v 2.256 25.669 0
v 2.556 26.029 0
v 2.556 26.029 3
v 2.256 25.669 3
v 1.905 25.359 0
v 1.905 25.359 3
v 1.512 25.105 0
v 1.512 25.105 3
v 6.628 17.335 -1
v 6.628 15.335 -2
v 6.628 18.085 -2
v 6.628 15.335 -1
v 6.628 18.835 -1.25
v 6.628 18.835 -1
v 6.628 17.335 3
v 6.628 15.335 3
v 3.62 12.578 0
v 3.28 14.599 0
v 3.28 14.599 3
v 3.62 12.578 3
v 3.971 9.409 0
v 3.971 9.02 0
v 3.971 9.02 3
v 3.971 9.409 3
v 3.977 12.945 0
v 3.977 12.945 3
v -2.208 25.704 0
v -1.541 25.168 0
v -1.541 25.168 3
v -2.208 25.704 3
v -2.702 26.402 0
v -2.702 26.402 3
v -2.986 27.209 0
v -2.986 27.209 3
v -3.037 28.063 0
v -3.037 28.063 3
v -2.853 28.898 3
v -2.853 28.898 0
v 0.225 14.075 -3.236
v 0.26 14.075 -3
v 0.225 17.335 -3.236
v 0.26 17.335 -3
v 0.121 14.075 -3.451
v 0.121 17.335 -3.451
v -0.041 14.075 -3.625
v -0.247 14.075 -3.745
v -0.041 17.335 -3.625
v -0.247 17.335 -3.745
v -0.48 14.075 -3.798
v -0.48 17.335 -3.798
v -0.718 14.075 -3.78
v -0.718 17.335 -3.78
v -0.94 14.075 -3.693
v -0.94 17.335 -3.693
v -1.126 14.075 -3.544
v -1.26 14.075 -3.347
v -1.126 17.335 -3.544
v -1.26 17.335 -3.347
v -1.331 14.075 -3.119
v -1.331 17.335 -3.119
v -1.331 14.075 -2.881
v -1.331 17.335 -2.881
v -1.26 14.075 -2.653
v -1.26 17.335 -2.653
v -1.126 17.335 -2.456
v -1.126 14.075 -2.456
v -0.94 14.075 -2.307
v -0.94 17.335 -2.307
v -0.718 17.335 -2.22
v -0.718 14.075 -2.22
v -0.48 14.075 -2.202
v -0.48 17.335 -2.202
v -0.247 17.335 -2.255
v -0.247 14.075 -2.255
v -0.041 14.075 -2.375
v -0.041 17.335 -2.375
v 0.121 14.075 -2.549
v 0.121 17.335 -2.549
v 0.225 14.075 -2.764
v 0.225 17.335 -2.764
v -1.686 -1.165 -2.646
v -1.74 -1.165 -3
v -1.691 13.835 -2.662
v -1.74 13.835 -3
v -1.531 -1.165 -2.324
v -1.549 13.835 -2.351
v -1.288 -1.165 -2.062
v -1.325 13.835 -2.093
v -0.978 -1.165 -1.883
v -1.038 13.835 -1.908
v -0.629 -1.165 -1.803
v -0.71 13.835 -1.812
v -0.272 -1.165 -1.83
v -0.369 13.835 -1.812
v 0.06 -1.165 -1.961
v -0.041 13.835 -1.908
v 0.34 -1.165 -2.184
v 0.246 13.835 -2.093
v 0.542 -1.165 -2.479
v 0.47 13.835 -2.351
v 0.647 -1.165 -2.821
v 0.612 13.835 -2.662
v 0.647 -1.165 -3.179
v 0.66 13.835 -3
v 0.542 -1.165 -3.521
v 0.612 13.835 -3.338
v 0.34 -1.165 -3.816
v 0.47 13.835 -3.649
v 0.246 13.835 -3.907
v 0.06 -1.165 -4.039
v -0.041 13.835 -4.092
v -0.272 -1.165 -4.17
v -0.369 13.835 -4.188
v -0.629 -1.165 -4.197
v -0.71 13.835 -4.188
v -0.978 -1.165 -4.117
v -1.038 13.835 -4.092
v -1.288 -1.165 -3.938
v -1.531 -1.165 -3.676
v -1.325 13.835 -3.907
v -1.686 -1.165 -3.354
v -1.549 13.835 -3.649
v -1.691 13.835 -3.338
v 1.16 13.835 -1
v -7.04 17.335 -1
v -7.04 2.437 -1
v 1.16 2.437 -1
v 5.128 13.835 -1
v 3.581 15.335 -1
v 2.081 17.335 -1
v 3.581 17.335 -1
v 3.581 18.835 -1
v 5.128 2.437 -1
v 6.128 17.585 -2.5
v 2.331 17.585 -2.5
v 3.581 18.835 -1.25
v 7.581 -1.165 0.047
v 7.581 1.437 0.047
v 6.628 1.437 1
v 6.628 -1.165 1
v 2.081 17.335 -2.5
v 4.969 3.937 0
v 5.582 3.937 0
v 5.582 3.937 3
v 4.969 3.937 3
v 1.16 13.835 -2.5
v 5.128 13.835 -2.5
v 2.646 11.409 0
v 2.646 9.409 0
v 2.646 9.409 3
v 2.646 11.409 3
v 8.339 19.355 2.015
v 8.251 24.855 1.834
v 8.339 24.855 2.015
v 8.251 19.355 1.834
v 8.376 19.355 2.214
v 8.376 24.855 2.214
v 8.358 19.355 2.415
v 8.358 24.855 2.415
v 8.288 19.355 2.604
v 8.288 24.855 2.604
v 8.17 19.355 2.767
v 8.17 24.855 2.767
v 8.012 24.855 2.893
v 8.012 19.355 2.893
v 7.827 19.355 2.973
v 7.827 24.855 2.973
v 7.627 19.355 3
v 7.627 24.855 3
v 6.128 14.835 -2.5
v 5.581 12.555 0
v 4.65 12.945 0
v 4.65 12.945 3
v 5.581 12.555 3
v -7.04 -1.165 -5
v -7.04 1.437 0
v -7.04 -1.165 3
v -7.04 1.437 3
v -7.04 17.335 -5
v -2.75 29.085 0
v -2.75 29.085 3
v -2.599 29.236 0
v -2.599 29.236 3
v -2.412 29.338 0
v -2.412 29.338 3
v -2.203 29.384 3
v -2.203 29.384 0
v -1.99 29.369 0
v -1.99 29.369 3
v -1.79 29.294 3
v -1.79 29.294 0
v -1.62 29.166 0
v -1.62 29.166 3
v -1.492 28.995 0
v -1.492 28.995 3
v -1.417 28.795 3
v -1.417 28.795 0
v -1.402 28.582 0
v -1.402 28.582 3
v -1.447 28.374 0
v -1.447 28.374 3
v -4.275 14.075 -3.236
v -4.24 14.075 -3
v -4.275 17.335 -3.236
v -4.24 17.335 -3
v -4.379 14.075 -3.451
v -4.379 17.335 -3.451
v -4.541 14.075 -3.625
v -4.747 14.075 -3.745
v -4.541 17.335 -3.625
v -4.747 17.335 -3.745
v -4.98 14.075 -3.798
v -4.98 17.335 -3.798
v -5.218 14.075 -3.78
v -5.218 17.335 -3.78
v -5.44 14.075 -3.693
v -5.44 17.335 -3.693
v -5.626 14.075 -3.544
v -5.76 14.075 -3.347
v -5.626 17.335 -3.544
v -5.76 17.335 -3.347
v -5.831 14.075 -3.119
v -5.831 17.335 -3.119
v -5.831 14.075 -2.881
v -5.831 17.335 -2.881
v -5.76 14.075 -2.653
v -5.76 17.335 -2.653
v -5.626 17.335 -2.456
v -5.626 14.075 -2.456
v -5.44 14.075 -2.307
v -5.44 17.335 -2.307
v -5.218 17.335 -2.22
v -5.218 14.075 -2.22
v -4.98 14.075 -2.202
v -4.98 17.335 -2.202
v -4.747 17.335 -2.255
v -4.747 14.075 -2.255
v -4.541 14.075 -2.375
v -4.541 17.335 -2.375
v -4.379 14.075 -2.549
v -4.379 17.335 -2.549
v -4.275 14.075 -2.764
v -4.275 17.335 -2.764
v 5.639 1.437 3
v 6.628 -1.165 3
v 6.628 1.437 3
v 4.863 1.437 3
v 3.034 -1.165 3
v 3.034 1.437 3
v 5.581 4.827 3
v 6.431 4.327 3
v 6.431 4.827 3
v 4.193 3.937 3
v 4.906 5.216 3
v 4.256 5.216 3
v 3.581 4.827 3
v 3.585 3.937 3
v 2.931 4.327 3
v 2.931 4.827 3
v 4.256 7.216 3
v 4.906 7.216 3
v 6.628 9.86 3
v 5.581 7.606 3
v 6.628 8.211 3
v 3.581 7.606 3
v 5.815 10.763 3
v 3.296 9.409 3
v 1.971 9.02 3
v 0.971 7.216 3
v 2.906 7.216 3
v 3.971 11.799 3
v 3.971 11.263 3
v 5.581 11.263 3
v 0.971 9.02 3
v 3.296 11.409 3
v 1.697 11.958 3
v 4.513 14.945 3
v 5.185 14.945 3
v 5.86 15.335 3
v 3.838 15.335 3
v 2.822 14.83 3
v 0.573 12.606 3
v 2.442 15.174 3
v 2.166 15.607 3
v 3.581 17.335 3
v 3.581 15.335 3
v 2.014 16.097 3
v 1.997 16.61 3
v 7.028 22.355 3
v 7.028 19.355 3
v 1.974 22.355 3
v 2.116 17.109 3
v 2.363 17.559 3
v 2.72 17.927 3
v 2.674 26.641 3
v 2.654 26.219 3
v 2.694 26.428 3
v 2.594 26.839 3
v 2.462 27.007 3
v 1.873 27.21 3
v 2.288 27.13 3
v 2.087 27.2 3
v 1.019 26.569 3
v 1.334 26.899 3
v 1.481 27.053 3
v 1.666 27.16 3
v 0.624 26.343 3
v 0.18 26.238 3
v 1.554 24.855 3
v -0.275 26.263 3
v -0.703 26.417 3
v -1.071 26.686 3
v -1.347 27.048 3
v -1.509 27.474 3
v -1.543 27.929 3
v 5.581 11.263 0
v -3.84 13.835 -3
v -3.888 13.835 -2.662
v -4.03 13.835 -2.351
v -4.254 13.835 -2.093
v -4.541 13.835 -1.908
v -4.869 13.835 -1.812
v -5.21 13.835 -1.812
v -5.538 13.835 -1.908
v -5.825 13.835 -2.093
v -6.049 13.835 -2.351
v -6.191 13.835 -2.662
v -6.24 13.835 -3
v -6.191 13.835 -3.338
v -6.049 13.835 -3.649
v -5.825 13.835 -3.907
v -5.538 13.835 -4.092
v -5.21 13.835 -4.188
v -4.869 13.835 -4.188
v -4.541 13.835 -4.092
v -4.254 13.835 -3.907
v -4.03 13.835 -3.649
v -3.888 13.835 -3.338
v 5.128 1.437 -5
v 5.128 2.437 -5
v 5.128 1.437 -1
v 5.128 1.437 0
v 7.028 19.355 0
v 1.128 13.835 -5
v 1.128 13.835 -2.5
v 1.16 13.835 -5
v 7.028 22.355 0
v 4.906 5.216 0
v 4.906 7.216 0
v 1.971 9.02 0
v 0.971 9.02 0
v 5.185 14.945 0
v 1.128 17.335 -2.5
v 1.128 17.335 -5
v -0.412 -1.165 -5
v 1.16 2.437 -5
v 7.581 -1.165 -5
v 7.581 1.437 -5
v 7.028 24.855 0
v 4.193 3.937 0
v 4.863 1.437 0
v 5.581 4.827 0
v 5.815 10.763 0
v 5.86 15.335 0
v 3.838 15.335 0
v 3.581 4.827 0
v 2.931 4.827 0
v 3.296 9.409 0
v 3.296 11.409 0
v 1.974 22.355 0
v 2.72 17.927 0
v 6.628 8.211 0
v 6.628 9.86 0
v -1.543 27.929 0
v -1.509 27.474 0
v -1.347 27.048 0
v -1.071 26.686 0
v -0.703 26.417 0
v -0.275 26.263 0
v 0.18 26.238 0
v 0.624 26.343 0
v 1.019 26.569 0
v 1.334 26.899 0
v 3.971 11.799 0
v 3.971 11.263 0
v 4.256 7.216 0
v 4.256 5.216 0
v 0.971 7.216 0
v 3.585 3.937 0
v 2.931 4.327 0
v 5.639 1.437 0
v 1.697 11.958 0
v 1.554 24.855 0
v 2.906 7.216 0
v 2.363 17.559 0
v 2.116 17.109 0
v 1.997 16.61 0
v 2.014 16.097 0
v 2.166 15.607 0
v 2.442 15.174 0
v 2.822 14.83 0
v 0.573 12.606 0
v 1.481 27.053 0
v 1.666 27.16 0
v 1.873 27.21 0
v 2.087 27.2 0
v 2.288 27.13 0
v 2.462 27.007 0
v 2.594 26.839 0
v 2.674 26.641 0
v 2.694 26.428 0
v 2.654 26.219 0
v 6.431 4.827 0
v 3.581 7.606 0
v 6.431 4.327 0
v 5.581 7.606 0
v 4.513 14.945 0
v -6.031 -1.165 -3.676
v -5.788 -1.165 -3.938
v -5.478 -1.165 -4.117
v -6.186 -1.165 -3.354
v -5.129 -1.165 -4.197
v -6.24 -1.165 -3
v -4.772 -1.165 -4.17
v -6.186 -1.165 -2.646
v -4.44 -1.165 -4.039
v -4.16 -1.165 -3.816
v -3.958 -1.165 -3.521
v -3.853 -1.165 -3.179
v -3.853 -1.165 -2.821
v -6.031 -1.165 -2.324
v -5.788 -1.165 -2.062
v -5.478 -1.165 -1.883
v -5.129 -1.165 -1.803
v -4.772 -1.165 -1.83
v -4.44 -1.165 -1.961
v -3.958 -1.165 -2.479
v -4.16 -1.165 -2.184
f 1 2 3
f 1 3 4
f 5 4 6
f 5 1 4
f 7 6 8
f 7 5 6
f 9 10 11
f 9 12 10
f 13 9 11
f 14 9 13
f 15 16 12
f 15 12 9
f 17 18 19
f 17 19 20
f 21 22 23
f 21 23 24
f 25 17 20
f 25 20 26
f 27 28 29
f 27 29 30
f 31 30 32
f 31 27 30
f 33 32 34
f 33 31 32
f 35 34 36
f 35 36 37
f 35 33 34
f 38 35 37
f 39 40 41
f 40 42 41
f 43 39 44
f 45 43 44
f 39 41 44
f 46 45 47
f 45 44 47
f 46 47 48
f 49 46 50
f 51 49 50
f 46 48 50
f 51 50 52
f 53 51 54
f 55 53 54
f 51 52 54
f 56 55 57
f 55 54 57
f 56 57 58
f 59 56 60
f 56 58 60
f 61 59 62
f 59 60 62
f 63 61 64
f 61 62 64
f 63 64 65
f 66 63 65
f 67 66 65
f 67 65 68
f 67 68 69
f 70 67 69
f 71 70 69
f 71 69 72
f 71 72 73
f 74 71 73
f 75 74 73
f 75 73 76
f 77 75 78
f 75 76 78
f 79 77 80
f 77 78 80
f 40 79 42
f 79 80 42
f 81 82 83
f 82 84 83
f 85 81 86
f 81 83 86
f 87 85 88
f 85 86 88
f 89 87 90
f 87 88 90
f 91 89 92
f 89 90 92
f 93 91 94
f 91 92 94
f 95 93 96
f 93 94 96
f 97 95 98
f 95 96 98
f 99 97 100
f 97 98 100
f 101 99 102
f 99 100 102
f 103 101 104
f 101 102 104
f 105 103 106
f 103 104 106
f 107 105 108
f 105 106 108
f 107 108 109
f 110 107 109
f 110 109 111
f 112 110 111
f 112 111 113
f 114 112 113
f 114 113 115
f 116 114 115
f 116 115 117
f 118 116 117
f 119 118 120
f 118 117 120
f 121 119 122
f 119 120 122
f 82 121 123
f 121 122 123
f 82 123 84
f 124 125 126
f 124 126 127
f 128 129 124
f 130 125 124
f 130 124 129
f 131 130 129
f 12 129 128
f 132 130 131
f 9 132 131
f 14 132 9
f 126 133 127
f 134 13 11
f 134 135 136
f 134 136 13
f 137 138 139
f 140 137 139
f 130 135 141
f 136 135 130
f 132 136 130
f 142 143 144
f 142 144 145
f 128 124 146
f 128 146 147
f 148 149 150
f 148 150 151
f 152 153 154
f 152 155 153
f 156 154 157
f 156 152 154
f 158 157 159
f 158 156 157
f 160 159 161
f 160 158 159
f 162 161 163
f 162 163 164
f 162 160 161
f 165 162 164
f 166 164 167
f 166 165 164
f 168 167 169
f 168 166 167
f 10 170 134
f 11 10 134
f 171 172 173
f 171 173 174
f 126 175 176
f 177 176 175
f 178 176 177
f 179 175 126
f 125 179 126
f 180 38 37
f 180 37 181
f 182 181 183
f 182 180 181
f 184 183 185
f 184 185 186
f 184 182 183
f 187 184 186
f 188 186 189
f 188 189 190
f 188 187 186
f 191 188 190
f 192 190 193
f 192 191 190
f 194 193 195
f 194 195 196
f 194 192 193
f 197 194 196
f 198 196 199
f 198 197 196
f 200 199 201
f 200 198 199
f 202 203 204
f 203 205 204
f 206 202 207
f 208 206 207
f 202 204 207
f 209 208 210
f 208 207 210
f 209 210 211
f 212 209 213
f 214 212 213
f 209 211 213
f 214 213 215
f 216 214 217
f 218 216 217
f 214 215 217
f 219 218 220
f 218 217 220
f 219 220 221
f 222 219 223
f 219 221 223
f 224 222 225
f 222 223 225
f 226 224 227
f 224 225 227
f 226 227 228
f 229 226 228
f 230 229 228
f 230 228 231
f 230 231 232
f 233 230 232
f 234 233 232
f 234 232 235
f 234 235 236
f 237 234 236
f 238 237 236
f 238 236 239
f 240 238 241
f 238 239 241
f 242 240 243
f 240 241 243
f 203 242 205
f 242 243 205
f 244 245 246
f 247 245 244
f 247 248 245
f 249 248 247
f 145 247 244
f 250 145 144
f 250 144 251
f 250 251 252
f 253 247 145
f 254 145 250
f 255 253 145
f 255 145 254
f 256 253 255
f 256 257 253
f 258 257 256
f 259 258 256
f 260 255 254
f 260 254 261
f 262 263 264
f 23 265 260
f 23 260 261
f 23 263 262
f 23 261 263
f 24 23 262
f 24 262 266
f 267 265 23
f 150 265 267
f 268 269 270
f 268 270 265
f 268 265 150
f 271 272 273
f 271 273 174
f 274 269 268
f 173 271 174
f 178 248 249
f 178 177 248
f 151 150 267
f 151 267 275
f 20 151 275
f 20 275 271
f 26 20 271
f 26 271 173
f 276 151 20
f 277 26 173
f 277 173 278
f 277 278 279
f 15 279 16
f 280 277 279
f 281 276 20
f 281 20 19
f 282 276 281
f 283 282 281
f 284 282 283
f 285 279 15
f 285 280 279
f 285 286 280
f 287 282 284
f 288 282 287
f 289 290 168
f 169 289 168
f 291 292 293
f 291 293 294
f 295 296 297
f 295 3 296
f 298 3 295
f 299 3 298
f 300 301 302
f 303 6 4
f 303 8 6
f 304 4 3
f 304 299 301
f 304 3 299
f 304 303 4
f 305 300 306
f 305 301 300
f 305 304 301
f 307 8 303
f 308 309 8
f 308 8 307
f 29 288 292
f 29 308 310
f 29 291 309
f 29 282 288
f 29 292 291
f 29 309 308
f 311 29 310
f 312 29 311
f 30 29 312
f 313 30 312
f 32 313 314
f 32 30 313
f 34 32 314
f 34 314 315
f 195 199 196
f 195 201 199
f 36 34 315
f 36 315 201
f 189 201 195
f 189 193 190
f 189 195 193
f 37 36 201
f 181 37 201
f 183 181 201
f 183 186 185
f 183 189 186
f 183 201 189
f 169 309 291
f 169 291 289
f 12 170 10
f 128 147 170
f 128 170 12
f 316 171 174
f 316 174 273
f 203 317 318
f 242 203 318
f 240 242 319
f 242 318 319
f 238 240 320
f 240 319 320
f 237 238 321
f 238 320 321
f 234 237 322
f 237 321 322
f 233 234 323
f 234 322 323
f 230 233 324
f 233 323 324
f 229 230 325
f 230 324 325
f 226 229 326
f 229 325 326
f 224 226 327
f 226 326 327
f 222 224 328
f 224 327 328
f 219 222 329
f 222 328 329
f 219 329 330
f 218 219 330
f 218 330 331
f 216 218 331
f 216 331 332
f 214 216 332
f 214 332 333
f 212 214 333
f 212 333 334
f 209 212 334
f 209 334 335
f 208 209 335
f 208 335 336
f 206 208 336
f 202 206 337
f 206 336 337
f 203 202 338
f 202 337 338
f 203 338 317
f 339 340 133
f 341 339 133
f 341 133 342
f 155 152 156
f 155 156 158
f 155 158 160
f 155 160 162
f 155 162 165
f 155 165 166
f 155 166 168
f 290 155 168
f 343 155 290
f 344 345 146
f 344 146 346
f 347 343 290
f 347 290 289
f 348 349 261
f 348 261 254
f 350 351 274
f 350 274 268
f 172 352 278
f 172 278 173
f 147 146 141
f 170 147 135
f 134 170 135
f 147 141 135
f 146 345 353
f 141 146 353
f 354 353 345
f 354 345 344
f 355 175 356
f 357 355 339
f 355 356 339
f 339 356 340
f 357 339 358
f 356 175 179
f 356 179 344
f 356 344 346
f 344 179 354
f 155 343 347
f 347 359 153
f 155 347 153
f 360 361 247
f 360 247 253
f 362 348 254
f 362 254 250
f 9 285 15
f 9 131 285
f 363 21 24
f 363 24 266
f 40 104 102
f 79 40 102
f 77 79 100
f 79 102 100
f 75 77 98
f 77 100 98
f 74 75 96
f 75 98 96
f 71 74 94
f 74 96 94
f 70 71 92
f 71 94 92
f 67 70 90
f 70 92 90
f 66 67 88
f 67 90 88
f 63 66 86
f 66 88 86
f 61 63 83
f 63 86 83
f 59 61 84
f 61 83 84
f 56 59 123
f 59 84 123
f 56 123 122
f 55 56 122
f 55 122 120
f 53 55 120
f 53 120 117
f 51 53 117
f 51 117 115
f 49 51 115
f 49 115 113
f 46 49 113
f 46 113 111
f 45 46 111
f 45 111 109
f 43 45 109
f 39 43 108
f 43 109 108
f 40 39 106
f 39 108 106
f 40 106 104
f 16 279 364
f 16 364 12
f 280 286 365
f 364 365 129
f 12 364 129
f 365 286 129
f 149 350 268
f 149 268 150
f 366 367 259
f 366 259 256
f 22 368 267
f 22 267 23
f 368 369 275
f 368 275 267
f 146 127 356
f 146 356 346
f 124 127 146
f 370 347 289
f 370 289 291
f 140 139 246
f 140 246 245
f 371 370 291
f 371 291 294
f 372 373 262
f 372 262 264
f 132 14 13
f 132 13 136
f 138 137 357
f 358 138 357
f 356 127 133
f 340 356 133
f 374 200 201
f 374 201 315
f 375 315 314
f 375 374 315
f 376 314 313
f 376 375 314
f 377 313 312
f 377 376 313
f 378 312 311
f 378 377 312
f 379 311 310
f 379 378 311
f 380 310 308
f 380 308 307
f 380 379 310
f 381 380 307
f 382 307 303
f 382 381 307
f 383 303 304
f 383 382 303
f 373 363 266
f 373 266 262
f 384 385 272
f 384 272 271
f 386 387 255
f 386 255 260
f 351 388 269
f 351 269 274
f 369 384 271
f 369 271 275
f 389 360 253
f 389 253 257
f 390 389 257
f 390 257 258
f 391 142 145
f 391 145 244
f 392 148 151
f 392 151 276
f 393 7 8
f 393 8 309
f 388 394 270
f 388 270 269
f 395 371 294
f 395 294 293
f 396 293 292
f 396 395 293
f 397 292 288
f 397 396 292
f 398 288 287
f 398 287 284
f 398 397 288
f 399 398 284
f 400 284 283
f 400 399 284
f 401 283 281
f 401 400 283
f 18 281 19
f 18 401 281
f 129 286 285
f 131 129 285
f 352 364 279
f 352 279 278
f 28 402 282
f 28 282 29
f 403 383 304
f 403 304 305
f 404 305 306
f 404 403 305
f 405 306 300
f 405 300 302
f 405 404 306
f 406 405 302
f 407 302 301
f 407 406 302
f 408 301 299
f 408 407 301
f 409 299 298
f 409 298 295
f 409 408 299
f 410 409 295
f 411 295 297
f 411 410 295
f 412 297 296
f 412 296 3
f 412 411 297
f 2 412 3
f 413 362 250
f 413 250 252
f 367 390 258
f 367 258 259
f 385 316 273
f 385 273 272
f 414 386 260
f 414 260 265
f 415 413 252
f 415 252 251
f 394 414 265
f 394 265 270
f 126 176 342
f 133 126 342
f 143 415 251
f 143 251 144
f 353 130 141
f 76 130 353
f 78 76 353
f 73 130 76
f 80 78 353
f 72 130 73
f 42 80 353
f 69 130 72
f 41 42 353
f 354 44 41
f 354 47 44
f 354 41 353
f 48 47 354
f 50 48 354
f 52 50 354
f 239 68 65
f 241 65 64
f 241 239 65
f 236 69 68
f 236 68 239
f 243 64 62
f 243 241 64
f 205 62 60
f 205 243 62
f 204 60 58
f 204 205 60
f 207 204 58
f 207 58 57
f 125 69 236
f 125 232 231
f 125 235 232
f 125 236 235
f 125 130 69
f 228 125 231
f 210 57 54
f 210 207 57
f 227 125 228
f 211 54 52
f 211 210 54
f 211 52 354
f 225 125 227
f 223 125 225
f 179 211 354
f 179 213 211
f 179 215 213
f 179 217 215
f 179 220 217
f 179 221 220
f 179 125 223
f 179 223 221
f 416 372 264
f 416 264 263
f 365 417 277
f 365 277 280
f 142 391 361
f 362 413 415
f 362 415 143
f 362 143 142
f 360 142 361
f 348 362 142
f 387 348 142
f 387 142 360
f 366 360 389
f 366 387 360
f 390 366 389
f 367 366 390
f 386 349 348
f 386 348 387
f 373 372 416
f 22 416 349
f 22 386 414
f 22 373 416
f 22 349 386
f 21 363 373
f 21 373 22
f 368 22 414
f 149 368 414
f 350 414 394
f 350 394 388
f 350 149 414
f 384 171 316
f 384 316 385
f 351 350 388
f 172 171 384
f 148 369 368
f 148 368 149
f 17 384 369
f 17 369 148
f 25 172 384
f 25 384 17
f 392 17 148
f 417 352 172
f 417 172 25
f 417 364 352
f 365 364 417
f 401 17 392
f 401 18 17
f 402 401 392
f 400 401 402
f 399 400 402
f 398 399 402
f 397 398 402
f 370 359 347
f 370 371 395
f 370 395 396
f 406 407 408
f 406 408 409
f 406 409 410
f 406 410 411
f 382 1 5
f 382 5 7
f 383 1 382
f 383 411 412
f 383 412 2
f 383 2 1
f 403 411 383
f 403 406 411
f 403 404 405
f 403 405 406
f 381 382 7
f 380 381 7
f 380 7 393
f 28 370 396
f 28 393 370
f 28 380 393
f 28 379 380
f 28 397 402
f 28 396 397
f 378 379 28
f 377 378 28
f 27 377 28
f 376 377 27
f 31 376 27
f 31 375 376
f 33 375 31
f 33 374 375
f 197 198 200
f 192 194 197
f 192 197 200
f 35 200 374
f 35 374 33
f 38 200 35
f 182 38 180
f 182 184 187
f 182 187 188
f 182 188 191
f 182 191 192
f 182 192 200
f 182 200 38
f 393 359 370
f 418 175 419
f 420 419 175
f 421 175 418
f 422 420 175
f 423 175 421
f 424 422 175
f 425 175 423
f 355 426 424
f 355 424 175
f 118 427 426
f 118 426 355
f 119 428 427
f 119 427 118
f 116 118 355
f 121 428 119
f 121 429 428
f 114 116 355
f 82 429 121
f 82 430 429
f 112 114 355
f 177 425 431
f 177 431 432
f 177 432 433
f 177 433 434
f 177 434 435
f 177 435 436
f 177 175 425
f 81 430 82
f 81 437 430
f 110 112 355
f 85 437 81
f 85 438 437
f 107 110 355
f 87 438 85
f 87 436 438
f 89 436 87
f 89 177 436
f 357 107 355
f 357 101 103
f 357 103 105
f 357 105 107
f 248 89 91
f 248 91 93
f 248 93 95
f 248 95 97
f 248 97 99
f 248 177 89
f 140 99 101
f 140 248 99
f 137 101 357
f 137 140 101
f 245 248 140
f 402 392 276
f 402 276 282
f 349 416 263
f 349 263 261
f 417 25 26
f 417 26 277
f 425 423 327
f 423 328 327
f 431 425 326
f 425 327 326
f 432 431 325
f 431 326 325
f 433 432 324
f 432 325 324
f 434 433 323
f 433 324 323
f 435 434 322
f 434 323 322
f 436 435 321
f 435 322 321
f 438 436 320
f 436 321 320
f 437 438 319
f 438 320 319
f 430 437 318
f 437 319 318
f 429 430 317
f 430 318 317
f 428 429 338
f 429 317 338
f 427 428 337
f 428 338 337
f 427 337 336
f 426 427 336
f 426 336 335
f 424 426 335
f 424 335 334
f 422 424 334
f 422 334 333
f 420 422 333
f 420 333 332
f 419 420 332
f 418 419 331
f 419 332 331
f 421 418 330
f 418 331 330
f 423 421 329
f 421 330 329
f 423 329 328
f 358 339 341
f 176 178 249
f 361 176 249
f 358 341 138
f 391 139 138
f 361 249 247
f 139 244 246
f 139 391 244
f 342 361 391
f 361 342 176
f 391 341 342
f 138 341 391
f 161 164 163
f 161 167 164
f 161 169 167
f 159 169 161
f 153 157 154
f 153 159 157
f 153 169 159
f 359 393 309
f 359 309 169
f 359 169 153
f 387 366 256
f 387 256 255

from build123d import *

# Parameters (mm, degrees)
BOSS_SWITCH_BODY_DEPTH                    = 3
SKETCH1_W                                 = 4
SKETCH1_H                                 = 3.5
BOSS_FLANGE_WIDTH_DEPTH                   = 5
BOSS_FLANGE_HEIGHT_REACH                  = 35.863
SKETCH2_W                                 = 4
SKETCH2_H                                 = 2
SKETCH2_W_2                               = 8
SKETCH2_H_2                               = 2.602328973
CUT_UP_TO_DOWN_DERAILLEUR_CLEARANCE_REACH = 21.462
SKETCH10_W                                = 2.453096586
SKETCH10_H                                = 3
SKETCH17_W                                = 12.1675
SKETCH17_H                                = 4
BOSS_FLANGE_SUPPORT_DEPTH                 = 13.897671027
TAP_DRILL_FOR_M2X0_4_TAP1_D               = 1.6
M2_CLEARANCE_HOLE2_D                      = 2.4
M2_CLEARANCE_HOLE2_DEPTH                  = 15
M2_CLEARANCE_HOLE2_TIP                    = 0.721032743
CHAMFER_FLANGE_SUPPORT_SIZE               = 1.5
CHAMFER_FLANGE_SUPPORT_2_SIZE             = 1.5
CHAMFER_FLANGE_SUPPORT_3_SIZE             = 1
SKETCH23_W                                = 3.9675
SKETCH23_H                                = 11.397671027
CUT_GAP_FOR_PRINTING_DEPTH                = 32.000499688
SKETCH25_W                                = 0.953096586
SKETCH25_H                                = 3.5
CUT_DERAILLEUR_CLEARANCE_DEPTH            = 32.145320369
CHAMFER8_SIZE                             = 1
CUT_UP_TO_DOWN_CANTILEVER_SLOPE_REACH     = 34.315
SKETCH26_W                                = 5.907653686
SKETCH26_H                                = 5.795512344
CUT_WIDE_DERAILLEUR_CLEARANCE_DEPTH       = 33.195879702
CUT_WIDE_DERAILLEUR_CLEARANCE_DEPTH_BACK  = 4
SKETCH27_W                                = 2.5
SKETCH27_H                                = 5.000000046
CHAMFER9_SIZE                             = 1.25
SKETCH28_W                                = 3.046903414
SKETCH28_H                                = 1.5
CUT_EXTRUDE1_DEPTH                        = 1
FILLET1_R                                 = 0.75


# Some blends are built 0.0001 mm under size
with BuildPart() as part:
    # Sketch-SwitchBossUp → Boss-Switch Body (new body)
    with BuildSketch(Plane.XY):
        with BuildLine():
            Line((5.581091201, 12.55524379), (5.581100766, 11.263016279))
            Line((5.581100766, 11.263016279), (3.971265023, 11.263016279))
            Line((3.971265023, 11.263016279), (3.97126394, 11.79911022))
            Line((3.97126394, 11.79911022), (3.296271341, 11.409403061))
            Line((3.296271341, 11.409403061), (3.296271341, 9.409403061))
            Line((3.296271341, 9.409403061), (3.971278743, 9.019687356))
            Line((3.971278743, 9.019687356), (3.971278743, 9.409408058))
            Line((3.971278743, 9.409408058), (5.815189336, 10.763016279))
            Line((5.815189336, 10.763016279), (6.627976927, 9.860324207))
            Line((6.627976927, 9.860324207), (6.627976927, 8.210536505))
            Line((6.627976927, 8.210536505), (5.581127833, 7.606137899))
            Line((5.581127833, 7.606137899), (4.906138119, 7.216432406))
            Line((4.906138119, 7.216432406), (4.906138119, 5.216432406))
            Line((4.906138119, 5.216432406), (5.58114552, 4.826716701))
            Line((5.58114552, 4.826716701), (6.430577026, 4.826716701))
            Line((6.430577026, 4.826716701), (6.430577026, 4.326716701))
            Line((6.430577026, 4.326716701), (5.582379266, 3.937018274))
            Line((5.582379266, 3.937018274), (4.969366686, 3.937018274))
            Line((4.969366686, 3.937018274), (5.639239667, 1.437018274))
            Line((5.639239667, 1.437018274), (6.627976927, 1.437018274))
            Line((6.627976927, 1.437018274), (6.627976927, -1.165310699))
            Line((6.627976927, -1.165310699), (3.034464198, -1.165310699))
            Line((3.034464198, -1.165310699), (3.034464198, 1.437018274))
            Line((3.034464198, 1.437018274), (4.862782532, 1.437018274))
            Line((4.862782532, 1.437018274), (4.192909551, 3.937018274))
            Line((4.192909551, 3.937018274), (3.585032728, 3.937018274))
            Line((3.585032728, 3.937018274), (2.930577026, 4.326720436))
            Line((2.930577026, 4.326720436), (2.930577026, 4.826720436))
            Line((2.930577026, 4.826720436), (3.58114552, 4.826720436))
            Line((3.58114552, 4.826720436), (4.256138119, 5.216427595))
            Line((4.256138119, 5.216427595), (4.256138119, 7.216427595))
            Line((4.256138119, 7.216427595), (3.581130717, 7.6061433))
            Line((3.581130717, 7.6061433), (2.9061262, 7.216422599))
            Line((2.9061262, 7.216422599), (0.971281627, 7.216422599))
            Line((0.971281627, 7.216422599), (0.971281627, 9.019692757))
            Line((0.971281627, 9.019692757), (1.971281627, 9.019692757))
            Line((1.971281627, 9.019692757), (2.646271341, 9.40939825))
            Line((2.646271341, 9.40939825), (2.646271341, 11.40939825))
            Line((2.646271341, 11.40939825), (1.696557212, 11.957715958))
            Line((1.696557212, 11.957715958), (0.573317845, 12.60621851))
            Line((0.573317845, 12.60621851), (-1.541303694, 25.167805745))
            ThreePointArc((-1.541303694, 25.167805745), (-2.872284003, 26.795385437), (-2.852546321, 28.897797067))
            ThreePointArc((-2.852546321, 28.897797067), (-1.887813913, 29.338582026), (-1.447028953, 28.373849618))
            ThreePointArc((-1.447028953, 28.373849618), (-0.703448682, 26.416936722), (1.333779254, 26.898727173))
            ThreePointArc((1.333779254, 26.898727173), (2.379722745, 27.074801628), (2.555797201, 26.028858137))
            ThreePointArc((2.555797201, 26.028858137), (2.086504637, 25.507104397), (1.511513111, 25.104801997))
            Line((1.511513111, 25.104801997), (1.553598189, 24.854801997))
            Line((1.553598189, 24.854801997), (9.027976927, 24.854801997))
            Line((9.027976927, 24.854801997), (9.027976927, 22.354801997))
            Line((9.027976927, 22.354801997), (9.027976927, 19.354801997))
            Line((9.027976927, 19.354801997), (7.027976927, 19.354801997))
            Line((7.027976927, 19.354801997), (7.027976927, 22.354801997))
            Line((7.027976927, 22.354801997), (1.974448974, 22.354801997))
            Line((1.974448974, 22.354801997), (2.719778232, 17.927287042))
            ThreePointArc((2.719778232, 17.927287042), (2.013826204, 16.096957693), (3.280124137, 14.598637521))
            Line((3.280124137, 14.598637521), (3.620297651, 12.577888564))
            Line((3.620297651, 12.577888564), (3.976674365, 12.944956135))
            Line((3.976674365, 12.944956135), (4.512557947, 14.944960101))
            Line((4.512557947, 14.944960101), (3.837515632, 15.334689301))
            Line((3.837515632, 15.334689301), (3.581073513, 15.334689301))
            Line((3.581073513, 15.334689301), (3.581073513, 17.334689301))
            Line((3.581073513, 17.334689301), (5.725580434, 17.334689301))
            Line((5.725580434, 17.334689301), (6.627976927, 17.334689301))
            Line((6.627976927, 17.334689301), (6.627976927, 15.334689301))
            Line((6.627976927, 15.334689301), (5.860498075, 15.334689301))
            Line((5.860498075, 15.334689301), (5.185487464, 14.944965082))
            Line((5.185487464, 14.944965082), (4.649603883, 12.944961115))
            Line((4.649603883, 12.944961115), (5.581091201, 12.55524379))
        make_face()
    extrude(amount=BOSS_SWITCH_BODY_DEPTH)

    # Sketch1 → Boss-Flange Width (add)
    with BuildSketch(Plane(origin=(0, 0, 0), x_dir=(-1, 0, 0), z_dir=(0, 0, -1))):
        Polygon((-7.581073513, -1.165310699), (0.412170615, -1.165310699), (0.412170615, 1.437018274), (-3.034464198, 1.437018274), (-4.862782532, 1.437018274), (-5.639239667, 1.437018274), (-6.627976927, 1.437018274), (-7.581073513, 1.437018274), align=None)
        with Locations((-5.581073513, 17.084689301)):
            Rectangle(SKETCH1_W, SKETCH1_H)
    extrude(amount=BOSS_FLANGE_WIDTH_DEPTH)

    # Sketch2 → Boss-Flange Height (add, up to next)
    with BuildSketch(Plane(origin=(-7.039523073, 0, 0), x_dir=(0, 0, -1), z_dir=(1, 0, 0)), mode=Mode.PRIVATE) as boss_flange_height_sk1:
        with Locations((3, 16.334689301)):
            Rectangle(SKETCH2_W, SKETCH2_H)
    boss_flange_height_tool1 = extrude(boss_flange_height_sk1.sketch, amount=BOSS_FLANGE_HEIGHT_REACH, mode=Mode.PRIVATE) - part.part
    # Sketch2 → Boss-Flange Height (add, up to next)
    with BuildSketch(Plane(origin=(-7.039523073, 0, 0), x_dir=(0, 0, -1), z_dir=(1, 0, 0)), mode=Mode.PRIVATE) as boss_flange_height_sk2:
        with Locations((1, 0.135853787)):
            Rectangle(SKETCH2_W_2, SKETCH2_H_2)
    boss_flange_height_tool2 = extrude(boss_flange_height_sk2.sketch, amount=BOSS_FLANGE_HEIGHT_REACH, mode=Mode.PRIVATE) - part.part
    add(boss_flange_height_tool1.solids().sort_by_distance((-7.039523, 16.334689, -3))[0])
    add(boss_flange_height_tool2.solids().sort_by_distance((-7.039523, 0.135854, -1))[0])

    # Sketch10 → Cut-Up-To-Down Derailleur Clearance (cut, up to next)
    with BuildSketch(Plane(origin=(0, 15.334689301, 0), x_dir=(1, 0, 0), z_dir=(0, 1, 0)), mode=Mode.PRIVATE) as cut_up_to_down_derailleur_clearance_sk1:
        with Locations((6.35452522, 3.5)):
            Rectangle(SKETCH10_W, SKETCH10_H)
    cut_up_to_down_derailleur_clearance_tool1 = extrude(cut_up_to_down_derailleur_clearance_sk1.sketch, amount=CUT_UP_TO_DOWN_DERAILLEUR_CLEARANCE_REACH, mode=Mode.PRIVATE) & part.part
    add(cut_up_to_down_derailleur_clearance_tool1.solids().sort_by_distance((6.354525, 15.334689, -3.5))[0], mode=Mode.SUBTRACT)

    # Sketch17 → Boss-Flange Support (add)
    with BuildSketch(Plane.XZ.offset(-15.334689301)):
        with Locations((-0.955773073, -3)):
            Rectangle(SKETCH17_W, SKETCH17_H)
    extrude(amount=BOSS_FLANGE_SUPPORT_DEPTH)

    # Tap Drill for M2x0.4 Tap1 (through all)
    with Locations(Plane(origin=(0, -1.165310699, 0), x_dir=(-1, 0, 0), z_dir=(0, -1, 0))):
        with Locations((5.039523073, 3), (0.539523073, 3)):
            Hole(TAP_DRILL_FOR_M2X0_4_TAP1_D / 2)

    # M2 Clearance Hole2
    with Locations(Plane.XZ.offset(1.165310699)):
        with Locations((-5.039523073, -3), (-0.539523073, -3)):
            Hole(M2_CLEARANCE_HOLE2_D / 2, depth=M2_CLEARANCE_HOLE2_DEPTH)
            with Locations((0, 0, -(M2_CLEARANCE_HOLE2_DEPTH + M2_CLEARANCE_HOLE2_TIP / 2))):  # 118° drill point
                Cone(0, M2_CLEARANCE_HOLE2_D / 2, M2_CLEARANCE_HOLE2_TIP, mode=Mode.SUBTRACT)

    # Chamfer-Flange Support
    chamfer_flange_support_edges = [part.edges().sort_by_distance(p)[0] for p in [
        (3.581073513, 17.334689301, -3),
    ]]
    chamfer(chamfer_flange_support_edges, length=CHAMFER_FLANGE_SUPPORT_SIZE - 0.0001)  # a hair under: the kernel refuses the full size

    # Chamfer-Flange Support 2
    chamfer_flange_support_2_edges = [part.edges().sort_by_distance(p)[0] for p in [
        (5.127976927, 17.084689301, -2),
        (5.127976927, 15.334689301, -1.5),
    ]]
    chamfer(chamfer_flange_support_2_edges, length=CHAMFER_FLANGE_SUPPORT_2_SIZE)

    # Chamfer-Flange Support 3
    chamfer_flange_support_3_edges = [part.edges().sort_by_distance(p)[0] for p in [
        (-0.955773073, 1.437018274, -1),
    ]]
    chamfer(chamfer_flange_support_3_edges, length=CHAMFER_FLANGE_SUPPORT_3_SIZE - 0.0001)  # a hair under: the kernel refuses the full size

    # Sketch23 → Cut-Gap for Printing (cut, through all)
    with BuildSketch(Plane.XY.offset(-1)):
        with Locations((3.144226927, 8.135853788)):
            Rectangle(SKETCH23_W, SKETCH23_H)
    extrude(amount=-CUT_GAP_FOR_PRINTING_DEPTH, mode=Mode.SUBTRACT)

    # Sketch25 → Cut-Derailleur Clearance (cut, through all)
    with BuildSketch(Plane.XY):
        with Locations((7.10452522, 17.084689301)):
            Rectangle(SKETCH25_W, SKETCH25_H)
    extrude(amount=-CUT_DERAILLEUR_CLEARANCE_DEPTH, mode=Mode.SUBTRACT)

    # Chamfer8
    # the kernel refuses this chamfer: 1 mm, written as the material it adds along each edge
    with BuildSketch(Plane(origin=(6.627976927, 1.437018274, 0), x_dir=(0.9996219169112968, 0, -0.027495876610586365), z_dir=(0, -1, 0))) as chamfer8_piece_1_section:
        Polygon((CHAMFER8_SIZE * 0.999621916911, CHAMFER8_SIZE * 0.0274958766106), (-CHAMFER8_SIZE * 0.0274958766106, CHAMFER8_SIZE * 0.999621916911), (0, 0), align=None)
    chamfer8_piece_1 = extrude(amount=2.602328973, mode=Mode.PRIVATE)
    chamfer8_piece_1 = split(chamfer8_piece_1, bisect_by=Plane(origin=(7.581073513, 0.135853788, 0.332375145), z_dir=(-1, 0, 0)), keep=Keep.TOP, mode=Mode.PRIVATE)
    add(chamfer8_piece_1)

    # Sketch26 → Cut-Up-to-Down Cantilever Slope (cut, up to next)
    with BuildSketch(Plane(origin=(4.865522488, 0, -3.243681659), x_dir=(0.5547001962252291, 0, 0.8320502943378437), z_dir=(-0.8320502943378437, 0, 0.5547001962252291)), mode=Mode.PRIVATE) as cut_up_to_down_cantilever_slope_sk1:
        with Locations((5.823012163, 21.957045825)):
            Rectangle(SKETCH26_W, SKETCH26_H)
    cut_up_to_down_cantilever_slope_tool1 = extrude(cut_up_to_down_cantilever_slope_sk1.sketch, amount=-CUT_UP_TO_DOWN_CANTILEVER_SLOPE_REACH, mode=Mode.PRIVATE) & part.part
    add(cut_up_to_down_cantilever_slope_tool1.solids().sort_by_distance((8.095548, 21.957046, 1.601357))[0], mode=Mode.SUBTRACT)

    # Sketch27 → Cut-Wide Derailleur Clearance (cut, two sides: drawn at the far end of the back side and taken through both)
    with BuildSketch(Plane(origin=(5.127976927, 0, 0), x_dir=(0, 0, -1), z_dir=(1, 0, 0)).offset(-CUT_WIDE_DERAILLEUR_CLEARANCE_DEPTH_BACK)):
        with Locations((3.75, 16.334689324)):
            Rectangle(SKETCH27_W, SKETCH27_H)
    extrude(amount=CUT_WIDE_DERAILLEUR_CLEARANCE_DEPTH + CUT_WIDE_DERAILLEUR_CLEARANCE_DEPTH_BACK, mode=Mode.SUBTRACT)

    # Chamfer9
    chamfer9_edges = [part.edges().sort_by_distance(p)[0] for p in [
        (4.85452522, 18.834689347, -2.5),
    ]]
    chamfer(chamfer9_edges, length=CHAMFER9_SIZE)

    # Sketch28 → Cut-Extrude1 (cut)
    with BuildSketch(Plane.XY.offset(-1)):
        with Locations((5.10452522, 18.084689301)):
            Rectangle(SKETCH28_W, SKETCH28_H)
    extrude(amount=CUT_EXTRUDE1_DEPTH, mode=Mode.SUBTRACT)

    # Fillet1
    fillet1_edges = [part.edges().sort_by_distance(p)[0] for p in [
        (9.027976927, 22.104801997, 3),
    ]]
    fillet(fillet1_edges, radius=FILLET1_R)


solid = part.part
